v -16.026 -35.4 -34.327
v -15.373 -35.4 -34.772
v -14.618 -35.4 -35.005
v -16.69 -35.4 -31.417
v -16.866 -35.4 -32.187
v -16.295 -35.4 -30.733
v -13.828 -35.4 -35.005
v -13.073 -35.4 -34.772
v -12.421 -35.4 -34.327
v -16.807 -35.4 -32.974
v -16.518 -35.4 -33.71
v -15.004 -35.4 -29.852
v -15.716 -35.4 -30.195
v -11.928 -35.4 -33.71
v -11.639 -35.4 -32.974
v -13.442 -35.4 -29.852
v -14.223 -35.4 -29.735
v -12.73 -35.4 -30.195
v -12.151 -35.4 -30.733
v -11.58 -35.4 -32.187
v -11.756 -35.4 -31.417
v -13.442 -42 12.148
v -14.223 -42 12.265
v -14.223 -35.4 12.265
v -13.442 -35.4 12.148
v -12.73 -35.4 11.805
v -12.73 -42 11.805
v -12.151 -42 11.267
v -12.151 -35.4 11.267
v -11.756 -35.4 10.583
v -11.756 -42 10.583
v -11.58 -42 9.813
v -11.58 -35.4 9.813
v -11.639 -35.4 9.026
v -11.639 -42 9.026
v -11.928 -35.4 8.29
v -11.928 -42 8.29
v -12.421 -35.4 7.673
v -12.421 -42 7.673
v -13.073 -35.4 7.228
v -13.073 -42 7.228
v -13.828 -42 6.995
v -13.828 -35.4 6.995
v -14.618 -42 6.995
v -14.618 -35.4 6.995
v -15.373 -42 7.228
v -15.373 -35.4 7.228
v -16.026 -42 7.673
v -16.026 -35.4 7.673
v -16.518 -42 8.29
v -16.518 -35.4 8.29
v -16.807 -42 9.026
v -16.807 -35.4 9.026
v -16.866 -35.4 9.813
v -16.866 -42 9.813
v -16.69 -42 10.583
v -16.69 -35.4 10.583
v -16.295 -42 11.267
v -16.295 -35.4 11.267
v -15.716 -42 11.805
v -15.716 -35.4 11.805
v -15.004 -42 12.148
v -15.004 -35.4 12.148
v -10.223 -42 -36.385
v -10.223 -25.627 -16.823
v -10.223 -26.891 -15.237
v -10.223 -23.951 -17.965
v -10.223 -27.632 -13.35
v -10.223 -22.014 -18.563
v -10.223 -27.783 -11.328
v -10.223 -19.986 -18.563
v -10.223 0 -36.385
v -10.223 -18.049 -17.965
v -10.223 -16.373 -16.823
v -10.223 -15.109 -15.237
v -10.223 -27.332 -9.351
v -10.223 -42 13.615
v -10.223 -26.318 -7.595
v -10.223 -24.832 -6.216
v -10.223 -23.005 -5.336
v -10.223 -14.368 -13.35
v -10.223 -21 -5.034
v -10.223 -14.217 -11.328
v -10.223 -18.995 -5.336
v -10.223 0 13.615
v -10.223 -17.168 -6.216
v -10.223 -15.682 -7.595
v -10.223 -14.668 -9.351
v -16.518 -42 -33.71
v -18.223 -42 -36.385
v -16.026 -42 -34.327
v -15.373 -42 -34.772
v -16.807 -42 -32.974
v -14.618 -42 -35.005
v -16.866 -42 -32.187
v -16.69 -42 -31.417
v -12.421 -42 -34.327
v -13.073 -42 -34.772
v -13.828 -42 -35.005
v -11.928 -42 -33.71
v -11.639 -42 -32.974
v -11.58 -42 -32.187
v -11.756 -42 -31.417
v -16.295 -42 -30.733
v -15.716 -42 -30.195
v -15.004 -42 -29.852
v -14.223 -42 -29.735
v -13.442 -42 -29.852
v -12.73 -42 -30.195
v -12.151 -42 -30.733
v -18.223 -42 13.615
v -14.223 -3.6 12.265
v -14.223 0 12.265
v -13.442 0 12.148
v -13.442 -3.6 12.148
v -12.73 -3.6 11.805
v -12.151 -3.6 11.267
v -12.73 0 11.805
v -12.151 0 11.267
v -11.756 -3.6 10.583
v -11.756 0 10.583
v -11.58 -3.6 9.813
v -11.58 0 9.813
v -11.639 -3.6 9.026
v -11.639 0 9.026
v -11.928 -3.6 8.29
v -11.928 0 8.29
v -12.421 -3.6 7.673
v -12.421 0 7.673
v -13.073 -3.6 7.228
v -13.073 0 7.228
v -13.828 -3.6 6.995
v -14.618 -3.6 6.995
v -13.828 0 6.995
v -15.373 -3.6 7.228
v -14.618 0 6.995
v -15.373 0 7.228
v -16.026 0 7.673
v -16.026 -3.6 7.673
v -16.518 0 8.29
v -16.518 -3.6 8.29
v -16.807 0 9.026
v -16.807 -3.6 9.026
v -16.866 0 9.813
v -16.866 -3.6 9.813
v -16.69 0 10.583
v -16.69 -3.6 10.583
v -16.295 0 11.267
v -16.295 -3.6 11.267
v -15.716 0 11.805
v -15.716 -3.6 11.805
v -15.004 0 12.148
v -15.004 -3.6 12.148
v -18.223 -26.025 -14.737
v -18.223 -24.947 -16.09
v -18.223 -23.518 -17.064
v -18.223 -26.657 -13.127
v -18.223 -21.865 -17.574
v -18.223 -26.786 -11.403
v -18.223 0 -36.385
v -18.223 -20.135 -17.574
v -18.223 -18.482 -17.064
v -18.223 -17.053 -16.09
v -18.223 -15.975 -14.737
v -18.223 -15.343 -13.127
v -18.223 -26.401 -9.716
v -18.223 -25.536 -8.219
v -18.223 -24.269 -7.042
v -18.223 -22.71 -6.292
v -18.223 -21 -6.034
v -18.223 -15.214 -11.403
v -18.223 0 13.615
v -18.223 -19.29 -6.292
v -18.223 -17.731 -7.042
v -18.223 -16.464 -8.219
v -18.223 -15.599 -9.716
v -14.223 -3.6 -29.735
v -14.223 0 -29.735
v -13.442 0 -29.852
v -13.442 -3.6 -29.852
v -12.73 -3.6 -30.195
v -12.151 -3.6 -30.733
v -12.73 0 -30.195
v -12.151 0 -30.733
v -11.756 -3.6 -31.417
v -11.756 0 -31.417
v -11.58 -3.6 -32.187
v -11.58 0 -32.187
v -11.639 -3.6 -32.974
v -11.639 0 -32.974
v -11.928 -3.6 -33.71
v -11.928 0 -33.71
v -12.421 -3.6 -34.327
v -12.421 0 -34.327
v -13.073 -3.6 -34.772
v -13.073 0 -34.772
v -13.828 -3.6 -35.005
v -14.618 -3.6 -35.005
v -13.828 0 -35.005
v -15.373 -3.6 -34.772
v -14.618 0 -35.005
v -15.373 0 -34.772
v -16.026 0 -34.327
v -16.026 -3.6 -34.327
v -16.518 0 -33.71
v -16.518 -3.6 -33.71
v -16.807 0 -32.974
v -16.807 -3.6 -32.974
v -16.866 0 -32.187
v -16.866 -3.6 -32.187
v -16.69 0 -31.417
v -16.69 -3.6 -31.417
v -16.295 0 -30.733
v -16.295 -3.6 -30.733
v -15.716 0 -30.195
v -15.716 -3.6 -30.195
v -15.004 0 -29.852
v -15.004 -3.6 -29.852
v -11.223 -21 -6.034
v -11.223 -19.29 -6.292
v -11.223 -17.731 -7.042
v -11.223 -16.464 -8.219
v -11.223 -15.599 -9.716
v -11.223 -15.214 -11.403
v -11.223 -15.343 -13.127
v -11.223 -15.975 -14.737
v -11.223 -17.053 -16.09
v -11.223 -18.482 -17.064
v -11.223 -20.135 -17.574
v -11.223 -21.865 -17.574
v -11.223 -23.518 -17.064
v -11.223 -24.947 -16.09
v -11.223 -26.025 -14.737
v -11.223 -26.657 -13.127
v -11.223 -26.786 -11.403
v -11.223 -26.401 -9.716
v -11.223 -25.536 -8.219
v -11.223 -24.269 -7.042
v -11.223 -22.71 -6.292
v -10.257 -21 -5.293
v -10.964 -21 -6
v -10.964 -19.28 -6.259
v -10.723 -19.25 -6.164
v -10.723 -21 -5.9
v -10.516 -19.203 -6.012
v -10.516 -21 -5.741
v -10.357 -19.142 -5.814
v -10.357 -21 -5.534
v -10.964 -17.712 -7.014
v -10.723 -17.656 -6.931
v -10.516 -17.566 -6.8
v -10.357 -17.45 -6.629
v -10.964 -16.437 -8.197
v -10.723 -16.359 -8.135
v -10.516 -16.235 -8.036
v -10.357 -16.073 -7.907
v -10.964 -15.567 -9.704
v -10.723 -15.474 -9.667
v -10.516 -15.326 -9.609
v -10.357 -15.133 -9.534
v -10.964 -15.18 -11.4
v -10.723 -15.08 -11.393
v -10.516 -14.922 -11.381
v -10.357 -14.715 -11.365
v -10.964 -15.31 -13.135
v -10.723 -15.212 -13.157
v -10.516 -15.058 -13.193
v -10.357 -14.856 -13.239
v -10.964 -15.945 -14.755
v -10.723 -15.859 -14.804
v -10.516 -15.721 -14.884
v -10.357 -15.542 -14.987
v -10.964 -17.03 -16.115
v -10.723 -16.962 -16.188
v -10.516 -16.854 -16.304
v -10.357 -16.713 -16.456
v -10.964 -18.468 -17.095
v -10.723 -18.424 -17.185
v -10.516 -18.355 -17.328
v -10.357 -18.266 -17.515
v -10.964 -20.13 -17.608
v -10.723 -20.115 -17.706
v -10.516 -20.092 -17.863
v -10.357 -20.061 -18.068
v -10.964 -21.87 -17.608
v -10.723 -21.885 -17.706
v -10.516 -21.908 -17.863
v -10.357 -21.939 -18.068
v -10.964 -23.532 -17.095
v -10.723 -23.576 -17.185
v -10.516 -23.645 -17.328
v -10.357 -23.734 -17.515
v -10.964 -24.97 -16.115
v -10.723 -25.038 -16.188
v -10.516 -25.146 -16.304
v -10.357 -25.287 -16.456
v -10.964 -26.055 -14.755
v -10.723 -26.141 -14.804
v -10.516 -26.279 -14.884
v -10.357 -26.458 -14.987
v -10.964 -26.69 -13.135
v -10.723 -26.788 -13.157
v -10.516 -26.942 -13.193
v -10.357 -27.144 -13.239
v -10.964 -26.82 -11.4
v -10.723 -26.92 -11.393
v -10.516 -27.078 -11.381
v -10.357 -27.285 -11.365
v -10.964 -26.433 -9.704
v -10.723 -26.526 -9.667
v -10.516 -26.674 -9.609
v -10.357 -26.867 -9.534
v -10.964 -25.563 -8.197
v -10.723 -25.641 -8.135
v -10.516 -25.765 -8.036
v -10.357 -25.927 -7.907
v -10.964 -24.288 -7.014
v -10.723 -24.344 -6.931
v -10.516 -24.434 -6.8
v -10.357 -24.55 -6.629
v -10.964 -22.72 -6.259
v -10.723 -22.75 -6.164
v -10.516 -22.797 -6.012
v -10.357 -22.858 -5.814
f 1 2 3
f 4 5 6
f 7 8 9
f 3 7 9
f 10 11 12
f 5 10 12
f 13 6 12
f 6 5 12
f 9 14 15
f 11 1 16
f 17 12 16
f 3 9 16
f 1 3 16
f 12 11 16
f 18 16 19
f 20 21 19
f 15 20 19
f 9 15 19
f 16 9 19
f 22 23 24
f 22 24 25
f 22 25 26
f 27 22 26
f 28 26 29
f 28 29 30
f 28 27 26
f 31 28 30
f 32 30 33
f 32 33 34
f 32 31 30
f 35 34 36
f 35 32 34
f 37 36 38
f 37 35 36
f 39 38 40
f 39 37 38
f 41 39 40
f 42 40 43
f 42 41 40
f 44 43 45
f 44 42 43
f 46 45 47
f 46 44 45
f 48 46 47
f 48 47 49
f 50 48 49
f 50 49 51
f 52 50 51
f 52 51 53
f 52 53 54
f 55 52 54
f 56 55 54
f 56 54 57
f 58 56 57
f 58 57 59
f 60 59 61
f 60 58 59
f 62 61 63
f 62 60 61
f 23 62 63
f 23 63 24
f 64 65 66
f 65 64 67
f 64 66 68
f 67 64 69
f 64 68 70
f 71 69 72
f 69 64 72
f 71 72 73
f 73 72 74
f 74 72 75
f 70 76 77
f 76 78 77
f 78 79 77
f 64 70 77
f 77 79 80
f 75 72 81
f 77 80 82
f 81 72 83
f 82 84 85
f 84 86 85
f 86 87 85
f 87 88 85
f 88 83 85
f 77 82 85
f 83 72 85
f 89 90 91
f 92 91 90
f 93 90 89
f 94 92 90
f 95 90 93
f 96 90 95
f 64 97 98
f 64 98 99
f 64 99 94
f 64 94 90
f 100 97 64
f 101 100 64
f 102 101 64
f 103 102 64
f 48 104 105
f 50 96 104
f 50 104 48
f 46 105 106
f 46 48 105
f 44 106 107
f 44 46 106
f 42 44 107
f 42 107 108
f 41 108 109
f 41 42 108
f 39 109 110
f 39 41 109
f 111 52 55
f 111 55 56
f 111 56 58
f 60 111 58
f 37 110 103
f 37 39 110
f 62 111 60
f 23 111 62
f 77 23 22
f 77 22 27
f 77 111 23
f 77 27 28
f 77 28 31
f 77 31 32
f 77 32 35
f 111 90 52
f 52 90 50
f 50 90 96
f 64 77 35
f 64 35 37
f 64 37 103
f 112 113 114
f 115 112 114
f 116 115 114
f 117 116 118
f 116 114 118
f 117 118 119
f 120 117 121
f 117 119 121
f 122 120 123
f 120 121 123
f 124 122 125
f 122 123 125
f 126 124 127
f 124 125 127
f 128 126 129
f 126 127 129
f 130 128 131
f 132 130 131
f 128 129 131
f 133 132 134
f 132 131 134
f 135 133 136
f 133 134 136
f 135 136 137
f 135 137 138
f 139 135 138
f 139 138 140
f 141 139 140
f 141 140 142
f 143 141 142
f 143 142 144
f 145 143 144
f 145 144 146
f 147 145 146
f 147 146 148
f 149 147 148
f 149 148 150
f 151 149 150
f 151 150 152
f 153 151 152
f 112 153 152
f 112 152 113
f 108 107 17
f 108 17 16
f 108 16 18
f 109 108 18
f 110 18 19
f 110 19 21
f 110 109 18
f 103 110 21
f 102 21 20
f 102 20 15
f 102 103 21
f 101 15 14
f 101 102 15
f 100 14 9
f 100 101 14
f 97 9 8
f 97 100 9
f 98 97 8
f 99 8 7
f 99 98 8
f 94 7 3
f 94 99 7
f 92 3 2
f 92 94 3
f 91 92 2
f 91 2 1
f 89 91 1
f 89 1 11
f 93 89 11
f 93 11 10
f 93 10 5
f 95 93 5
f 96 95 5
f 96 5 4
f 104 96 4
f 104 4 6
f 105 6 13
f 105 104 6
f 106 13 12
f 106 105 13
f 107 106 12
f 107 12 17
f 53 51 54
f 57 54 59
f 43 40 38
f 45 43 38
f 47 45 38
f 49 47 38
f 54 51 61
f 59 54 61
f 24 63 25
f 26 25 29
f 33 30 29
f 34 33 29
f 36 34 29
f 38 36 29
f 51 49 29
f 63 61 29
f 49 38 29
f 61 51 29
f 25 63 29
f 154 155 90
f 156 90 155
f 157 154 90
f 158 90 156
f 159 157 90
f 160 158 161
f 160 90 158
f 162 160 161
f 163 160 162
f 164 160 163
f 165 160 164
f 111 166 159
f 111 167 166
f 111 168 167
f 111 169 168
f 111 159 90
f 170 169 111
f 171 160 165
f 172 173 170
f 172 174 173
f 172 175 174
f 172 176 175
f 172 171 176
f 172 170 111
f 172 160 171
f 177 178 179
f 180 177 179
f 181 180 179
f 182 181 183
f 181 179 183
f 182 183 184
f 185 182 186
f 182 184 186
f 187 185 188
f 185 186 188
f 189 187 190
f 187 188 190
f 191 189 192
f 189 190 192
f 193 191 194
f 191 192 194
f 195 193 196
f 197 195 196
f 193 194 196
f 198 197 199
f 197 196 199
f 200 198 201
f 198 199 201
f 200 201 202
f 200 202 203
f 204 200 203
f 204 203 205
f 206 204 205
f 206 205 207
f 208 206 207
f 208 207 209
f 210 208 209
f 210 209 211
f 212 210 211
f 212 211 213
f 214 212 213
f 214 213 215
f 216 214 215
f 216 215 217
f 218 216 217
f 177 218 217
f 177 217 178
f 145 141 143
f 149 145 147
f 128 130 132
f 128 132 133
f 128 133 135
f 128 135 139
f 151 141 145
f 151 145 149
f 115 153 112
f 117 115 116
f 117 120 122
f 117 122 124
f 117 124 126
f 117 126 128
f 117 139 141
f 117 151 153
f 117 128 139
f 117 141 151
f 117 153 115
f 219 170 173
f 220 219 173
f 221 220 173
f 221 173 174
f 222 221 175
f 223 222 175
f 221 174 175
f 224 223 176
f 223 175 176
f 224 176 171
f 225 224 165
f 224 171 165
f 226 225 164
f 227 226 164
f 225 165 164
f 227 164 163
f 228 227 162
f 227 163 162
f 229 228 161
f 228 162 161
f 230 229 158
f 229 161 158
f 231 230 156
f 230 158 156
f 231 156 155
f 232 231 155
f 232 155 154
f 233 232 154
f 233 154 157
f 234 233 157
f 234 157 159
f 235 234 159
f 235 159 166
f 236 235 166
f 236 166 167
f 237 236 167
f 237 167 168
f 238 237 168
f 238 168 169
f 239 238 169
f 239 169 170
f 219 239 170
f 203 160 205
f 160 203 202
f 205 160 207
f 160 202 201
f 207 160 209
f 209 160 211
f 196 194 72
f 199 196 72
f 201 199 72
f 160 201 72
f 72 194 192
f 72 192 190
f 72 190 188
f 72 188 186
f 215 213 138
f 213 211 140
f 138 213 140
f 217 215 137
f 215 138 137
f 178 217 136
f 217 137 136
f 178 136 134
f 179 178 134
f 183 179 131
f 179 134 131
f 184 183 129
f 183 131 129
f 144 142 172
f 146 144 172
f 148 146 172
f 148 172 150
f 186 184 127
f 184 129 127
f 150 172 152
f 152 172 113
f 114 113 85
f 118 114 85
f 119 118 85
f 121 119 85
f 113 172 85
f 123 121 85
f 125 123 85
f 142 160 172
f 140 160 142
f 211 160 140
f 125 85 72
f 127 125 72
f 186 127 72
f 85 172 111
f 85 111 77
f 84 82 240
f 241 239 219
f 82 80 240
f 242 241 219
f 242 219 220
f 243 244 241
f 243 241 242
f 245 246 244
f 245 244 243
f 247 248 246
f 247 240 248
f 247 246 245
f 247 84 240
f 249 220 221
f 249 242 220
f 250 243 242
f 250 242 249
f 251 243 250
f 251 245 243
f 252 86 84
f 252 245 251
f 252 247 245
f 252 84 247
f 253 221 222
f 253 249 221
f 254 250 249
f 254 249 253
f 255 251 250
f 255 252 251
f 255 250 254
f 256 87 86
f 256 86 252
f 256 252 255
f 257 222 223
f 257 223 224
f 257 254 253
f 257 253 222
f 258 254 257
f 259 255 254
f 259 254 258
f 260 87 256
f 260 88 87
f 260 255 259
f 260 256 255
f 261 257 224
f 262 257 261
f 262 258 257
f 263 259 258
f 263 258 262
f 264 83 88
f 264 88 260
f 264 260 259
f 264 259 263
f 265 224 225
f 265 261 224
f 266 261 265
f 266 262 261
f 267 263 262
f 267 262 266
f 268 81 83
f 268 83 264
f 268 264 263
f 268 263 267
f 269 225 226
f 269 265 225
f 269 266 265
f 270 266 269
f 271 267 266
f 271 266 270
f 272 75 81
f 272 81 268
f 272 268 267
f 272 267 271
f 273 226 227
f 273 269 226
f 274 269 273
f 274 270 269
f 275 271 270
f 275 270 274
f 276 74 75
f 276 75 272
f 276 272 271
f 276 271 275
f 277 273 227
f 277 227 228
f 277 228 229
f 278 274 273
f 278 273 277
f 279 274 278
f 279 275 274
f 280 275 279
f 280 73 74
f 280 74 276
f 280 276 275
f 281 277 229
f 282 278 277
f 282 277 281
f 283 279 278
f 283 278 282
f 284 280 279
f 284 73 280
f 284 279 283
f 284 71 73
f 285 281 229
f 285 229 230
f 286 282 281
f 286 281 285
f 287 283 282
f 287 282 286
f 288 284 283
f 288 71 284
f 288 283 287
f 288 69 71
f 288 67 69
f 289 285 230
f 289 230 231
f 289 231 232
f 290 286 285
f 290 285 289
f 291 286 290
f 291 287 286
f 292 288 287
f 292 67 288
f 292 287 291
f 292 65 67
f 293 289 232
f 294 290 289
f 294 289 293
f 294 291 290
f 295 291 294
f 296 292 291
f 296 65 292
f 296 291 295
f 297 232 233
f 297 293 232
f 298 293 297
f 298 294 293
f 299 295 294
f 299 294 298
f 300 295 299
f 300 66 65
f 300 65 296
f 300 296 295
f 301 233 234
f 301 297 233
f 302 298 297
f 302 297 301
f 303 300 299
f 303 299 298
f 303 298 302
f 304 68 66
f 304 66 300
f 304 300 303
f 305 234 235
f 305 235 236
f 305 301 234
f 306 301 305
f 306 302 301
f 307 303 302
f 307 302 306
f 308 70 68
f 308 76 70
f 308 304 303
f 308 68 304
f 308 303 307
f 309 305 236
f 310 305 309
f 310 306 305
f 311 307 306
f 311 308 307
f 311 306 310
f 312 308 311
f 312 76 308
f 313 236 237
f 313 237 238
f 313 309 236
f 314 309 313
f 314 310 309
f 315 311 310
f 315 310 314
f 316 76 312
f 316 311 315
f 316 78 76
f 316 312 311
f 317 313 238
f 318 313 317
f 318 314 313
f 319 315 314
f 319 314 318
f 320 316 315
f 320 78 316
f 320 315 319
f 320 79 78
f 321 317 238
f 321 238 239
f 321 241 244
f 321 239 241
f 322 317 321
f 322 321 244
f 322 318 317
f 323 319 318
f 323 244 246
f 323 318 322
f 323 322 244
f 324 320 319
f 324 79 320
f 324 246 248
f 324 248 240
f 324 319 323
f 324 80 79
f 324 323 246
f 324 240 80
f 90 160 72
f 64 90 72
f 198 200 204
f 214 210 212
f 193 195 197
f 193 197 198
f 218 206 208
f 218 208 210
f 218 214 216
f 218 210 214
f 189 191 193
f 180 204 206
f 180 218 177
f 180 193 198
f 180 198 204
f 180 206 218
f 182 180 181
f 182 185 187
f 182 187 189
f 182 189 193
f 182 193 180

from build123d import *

# Parameters (mm, degrees)
SKETCH1_W           = 25
SKETCH1_H           = 50
SKETCH1_R           = 3.4
BOSS_EXTRUDE1_DEPTH = 3
SKETCH2_W           = 50
SKETCH2_H           = 3
BOSS_EXTRUDE2_DEPTH = 8
SKETCH3_W           = 8
SKETCH3_H           = 50
BOSS_EXTRUDE3_DEPTH = 42
SKETCH4_R           = 2.65
CUT_EXTRUDE1_DEPTH  = 6.6
SKETCH5_R           = 5.802370205
CUT_EXTRUDE2_DEPTH  = 9
FILLET2_R           = 1
SKETCH6_R           = 12.6
BOSS_EXTRUDE4_DEPTH = 2
FILLET4_R           = 1
SKETCH8_R           = 1.589780168
SKETCH8_R_2         = 1.777428262
CUT_EXTRUDE3_DEPTH  = 10
SKETCH9_W           = 49.021678163
SKETCH9_H           = 20.976854622
CUT_EXTRUDE4_DEPTH  = 68.79439129


with BuildPart() as part:
    # Sketch1 → Boss-Extrude1 (new body)
    with BuildSketch(Plane(origin=(0, 0, 0), x_dir=(1, 0, 0), z_dir=(0, 1, 0))):
        with Locations((2.276951673, 11.384758364)):
            Rectangle(SKETCH1_W, SKETCH1_H)
        with Locations(Location((1.276951673, 11.384758364, 0), (0, 0, 270))):
            Circle(SKETCH1_R, mode=Mode.SUBTRACT)
    extrude(amount=BOSS_EXTRUDE1_DEPTH)

    # Sketch2 → Boss-Extrude2 (add)
    with BuildSketch(Plane.ZY.offset(10.223048327)):
        with Locations((-11.384758364, 1.5)):
            Rectangle(SKETCH2_W, SKETCH2_H)
    extrude(amount=BOSS_EXTRUDE2_DEPTH)

    # Sketch3 → Boss-Extrude3 (add)
    with BuildSketch(Plane.XZ):
        with Locations((-14.223048327, -11.384758364)):
            Rectangle(SKETCH3_W, SKETCH3_H)
    extrude(amount=BOSS_EXTRUDE3_DEPTH)

    # Sketch4 → Cut-Extrude1 (cut)
    with BuildSketch(Plane(origin=(0, 3, 0), x_dir=(1, 0, 0), z_dir=(0, 1, 0))):
        with Locations(Location((-14.223048327, 32.384758364, 0), (0, 0, 270))):
            Circle(SKETCH4_R)
        with Locations(Location((-14.223048327, -9.615241636, 0), (0, 0, 270))):
            Circle(SKETCH4_R)
    cut_extrude1 = extrude(amount=-CUT_EXTRUDE1_DEPTH, mode=Mode.SUBTRACT)

    # Mirror1: Cut-Extrude1 across plane
    add(cut_extrude1.mirror(Plane.ZX.offset(-19.5)), mode=Mode.SUBTRACT)

    # Sketch5 → Cut-Extrude2 (cut)
    with BuildSketch(Plane.ZY.offset(18.223048327)):
        with Locations((-11.836279124, -21)):
            Circle(SKETCH5_R)
    extrude(amount=-CUT_EXTRUDE2_DEPTH, mode=Mode.SUBTRACT)

    # Fillet2
    fillet2_edges = [part.edges().sort_by_distance(p)[0] for p in [
        (-10.223048327, -21, -17.638649329),
    ]]
    fillet(fillet2_edges, radius=FILLET2_R)

    # Mirror2: Cut-Extrude1 across plane
    add(cut_extrude1.mirror(Plane.ZY.offset(1.723048327)), mode=Mode.SUBTRACT)

    # Sketch6 → Boss-Extrude4 (add)
    with BuildSketch(Plane(origin=(0, 3, 0), x_dir=(1, 0, 0), z_dir=(0, 1, 0))):
        with BuildLine():
            Line((14.776951673, 5.825082115), (14.776951673, 16.944434614))
            ThreePointArc((14.776951673, 16.944434614), (-13.323048327, 11.384758364), (14.776951673, 5.825082115))
        make_face()
        with Locations(Location((1.276951673, 11.384758364, 0), (0, 0, 270))):
            Circle(SKETCH6_R, mode=Mode.SUBTRACT)
    extrude(amount=BOSS_EXTRUDE4_DEPTH)

    # Fillet4
    # the kernel refuses this fillet: 1 mm, written as the material it takes off along each edge
    with BuildSketch(Plane(origin=(14.776951673, 5, -3.325082115), x_dir=(0, -1, 0), z_dir=(0, 0, -1))) as fillet4_piece_1:
        with BuildLine():
            CenterArc((FILLET4_R, FILLET4_R), FILLET4_R, 180, 90)
            Line((0, FILLET4_R), (0, 0))
            Line((0, 0), (FILLET4_R, 0))
        make_face()
    extrude(amount=16.119352499, mode=Mode.SUBTRACT)

    # Sketch8 → Cut-Extrude3 (cut)
    with BuildSketch(Plane(origin=(0, 3, 0), x_dir=(1, 0, 0), z_dir=(0, 1, 0))):
        with Locations(Location((1.276951673, 19.884758364, 0), (0, 0, 270))):
            Circle(SKETCH8_R)
        with Locations(Location((1.276951673, 2.884758364, 0), (0, 0, 270))):
            Circle(SKETCH8_R_2)
    extrude(amount=-CUT_EXTRUDE3_DEPTH, mode=Mode.SUBTRACT)

    # Sketch9 → Cut-Extrude4 (cut, through all)
    with BuildSketch(Plane.XY.offset(13.615241636)):
        with Locations((-9.733887409, 10.488427311)):
            Rectangle(SKETCH9_W, SKETCH9_H)
    extrude(amount=-CUT_EXTRUDE4_DEPTH, mode=Mode.SUBTRACT)


solid = part.part
